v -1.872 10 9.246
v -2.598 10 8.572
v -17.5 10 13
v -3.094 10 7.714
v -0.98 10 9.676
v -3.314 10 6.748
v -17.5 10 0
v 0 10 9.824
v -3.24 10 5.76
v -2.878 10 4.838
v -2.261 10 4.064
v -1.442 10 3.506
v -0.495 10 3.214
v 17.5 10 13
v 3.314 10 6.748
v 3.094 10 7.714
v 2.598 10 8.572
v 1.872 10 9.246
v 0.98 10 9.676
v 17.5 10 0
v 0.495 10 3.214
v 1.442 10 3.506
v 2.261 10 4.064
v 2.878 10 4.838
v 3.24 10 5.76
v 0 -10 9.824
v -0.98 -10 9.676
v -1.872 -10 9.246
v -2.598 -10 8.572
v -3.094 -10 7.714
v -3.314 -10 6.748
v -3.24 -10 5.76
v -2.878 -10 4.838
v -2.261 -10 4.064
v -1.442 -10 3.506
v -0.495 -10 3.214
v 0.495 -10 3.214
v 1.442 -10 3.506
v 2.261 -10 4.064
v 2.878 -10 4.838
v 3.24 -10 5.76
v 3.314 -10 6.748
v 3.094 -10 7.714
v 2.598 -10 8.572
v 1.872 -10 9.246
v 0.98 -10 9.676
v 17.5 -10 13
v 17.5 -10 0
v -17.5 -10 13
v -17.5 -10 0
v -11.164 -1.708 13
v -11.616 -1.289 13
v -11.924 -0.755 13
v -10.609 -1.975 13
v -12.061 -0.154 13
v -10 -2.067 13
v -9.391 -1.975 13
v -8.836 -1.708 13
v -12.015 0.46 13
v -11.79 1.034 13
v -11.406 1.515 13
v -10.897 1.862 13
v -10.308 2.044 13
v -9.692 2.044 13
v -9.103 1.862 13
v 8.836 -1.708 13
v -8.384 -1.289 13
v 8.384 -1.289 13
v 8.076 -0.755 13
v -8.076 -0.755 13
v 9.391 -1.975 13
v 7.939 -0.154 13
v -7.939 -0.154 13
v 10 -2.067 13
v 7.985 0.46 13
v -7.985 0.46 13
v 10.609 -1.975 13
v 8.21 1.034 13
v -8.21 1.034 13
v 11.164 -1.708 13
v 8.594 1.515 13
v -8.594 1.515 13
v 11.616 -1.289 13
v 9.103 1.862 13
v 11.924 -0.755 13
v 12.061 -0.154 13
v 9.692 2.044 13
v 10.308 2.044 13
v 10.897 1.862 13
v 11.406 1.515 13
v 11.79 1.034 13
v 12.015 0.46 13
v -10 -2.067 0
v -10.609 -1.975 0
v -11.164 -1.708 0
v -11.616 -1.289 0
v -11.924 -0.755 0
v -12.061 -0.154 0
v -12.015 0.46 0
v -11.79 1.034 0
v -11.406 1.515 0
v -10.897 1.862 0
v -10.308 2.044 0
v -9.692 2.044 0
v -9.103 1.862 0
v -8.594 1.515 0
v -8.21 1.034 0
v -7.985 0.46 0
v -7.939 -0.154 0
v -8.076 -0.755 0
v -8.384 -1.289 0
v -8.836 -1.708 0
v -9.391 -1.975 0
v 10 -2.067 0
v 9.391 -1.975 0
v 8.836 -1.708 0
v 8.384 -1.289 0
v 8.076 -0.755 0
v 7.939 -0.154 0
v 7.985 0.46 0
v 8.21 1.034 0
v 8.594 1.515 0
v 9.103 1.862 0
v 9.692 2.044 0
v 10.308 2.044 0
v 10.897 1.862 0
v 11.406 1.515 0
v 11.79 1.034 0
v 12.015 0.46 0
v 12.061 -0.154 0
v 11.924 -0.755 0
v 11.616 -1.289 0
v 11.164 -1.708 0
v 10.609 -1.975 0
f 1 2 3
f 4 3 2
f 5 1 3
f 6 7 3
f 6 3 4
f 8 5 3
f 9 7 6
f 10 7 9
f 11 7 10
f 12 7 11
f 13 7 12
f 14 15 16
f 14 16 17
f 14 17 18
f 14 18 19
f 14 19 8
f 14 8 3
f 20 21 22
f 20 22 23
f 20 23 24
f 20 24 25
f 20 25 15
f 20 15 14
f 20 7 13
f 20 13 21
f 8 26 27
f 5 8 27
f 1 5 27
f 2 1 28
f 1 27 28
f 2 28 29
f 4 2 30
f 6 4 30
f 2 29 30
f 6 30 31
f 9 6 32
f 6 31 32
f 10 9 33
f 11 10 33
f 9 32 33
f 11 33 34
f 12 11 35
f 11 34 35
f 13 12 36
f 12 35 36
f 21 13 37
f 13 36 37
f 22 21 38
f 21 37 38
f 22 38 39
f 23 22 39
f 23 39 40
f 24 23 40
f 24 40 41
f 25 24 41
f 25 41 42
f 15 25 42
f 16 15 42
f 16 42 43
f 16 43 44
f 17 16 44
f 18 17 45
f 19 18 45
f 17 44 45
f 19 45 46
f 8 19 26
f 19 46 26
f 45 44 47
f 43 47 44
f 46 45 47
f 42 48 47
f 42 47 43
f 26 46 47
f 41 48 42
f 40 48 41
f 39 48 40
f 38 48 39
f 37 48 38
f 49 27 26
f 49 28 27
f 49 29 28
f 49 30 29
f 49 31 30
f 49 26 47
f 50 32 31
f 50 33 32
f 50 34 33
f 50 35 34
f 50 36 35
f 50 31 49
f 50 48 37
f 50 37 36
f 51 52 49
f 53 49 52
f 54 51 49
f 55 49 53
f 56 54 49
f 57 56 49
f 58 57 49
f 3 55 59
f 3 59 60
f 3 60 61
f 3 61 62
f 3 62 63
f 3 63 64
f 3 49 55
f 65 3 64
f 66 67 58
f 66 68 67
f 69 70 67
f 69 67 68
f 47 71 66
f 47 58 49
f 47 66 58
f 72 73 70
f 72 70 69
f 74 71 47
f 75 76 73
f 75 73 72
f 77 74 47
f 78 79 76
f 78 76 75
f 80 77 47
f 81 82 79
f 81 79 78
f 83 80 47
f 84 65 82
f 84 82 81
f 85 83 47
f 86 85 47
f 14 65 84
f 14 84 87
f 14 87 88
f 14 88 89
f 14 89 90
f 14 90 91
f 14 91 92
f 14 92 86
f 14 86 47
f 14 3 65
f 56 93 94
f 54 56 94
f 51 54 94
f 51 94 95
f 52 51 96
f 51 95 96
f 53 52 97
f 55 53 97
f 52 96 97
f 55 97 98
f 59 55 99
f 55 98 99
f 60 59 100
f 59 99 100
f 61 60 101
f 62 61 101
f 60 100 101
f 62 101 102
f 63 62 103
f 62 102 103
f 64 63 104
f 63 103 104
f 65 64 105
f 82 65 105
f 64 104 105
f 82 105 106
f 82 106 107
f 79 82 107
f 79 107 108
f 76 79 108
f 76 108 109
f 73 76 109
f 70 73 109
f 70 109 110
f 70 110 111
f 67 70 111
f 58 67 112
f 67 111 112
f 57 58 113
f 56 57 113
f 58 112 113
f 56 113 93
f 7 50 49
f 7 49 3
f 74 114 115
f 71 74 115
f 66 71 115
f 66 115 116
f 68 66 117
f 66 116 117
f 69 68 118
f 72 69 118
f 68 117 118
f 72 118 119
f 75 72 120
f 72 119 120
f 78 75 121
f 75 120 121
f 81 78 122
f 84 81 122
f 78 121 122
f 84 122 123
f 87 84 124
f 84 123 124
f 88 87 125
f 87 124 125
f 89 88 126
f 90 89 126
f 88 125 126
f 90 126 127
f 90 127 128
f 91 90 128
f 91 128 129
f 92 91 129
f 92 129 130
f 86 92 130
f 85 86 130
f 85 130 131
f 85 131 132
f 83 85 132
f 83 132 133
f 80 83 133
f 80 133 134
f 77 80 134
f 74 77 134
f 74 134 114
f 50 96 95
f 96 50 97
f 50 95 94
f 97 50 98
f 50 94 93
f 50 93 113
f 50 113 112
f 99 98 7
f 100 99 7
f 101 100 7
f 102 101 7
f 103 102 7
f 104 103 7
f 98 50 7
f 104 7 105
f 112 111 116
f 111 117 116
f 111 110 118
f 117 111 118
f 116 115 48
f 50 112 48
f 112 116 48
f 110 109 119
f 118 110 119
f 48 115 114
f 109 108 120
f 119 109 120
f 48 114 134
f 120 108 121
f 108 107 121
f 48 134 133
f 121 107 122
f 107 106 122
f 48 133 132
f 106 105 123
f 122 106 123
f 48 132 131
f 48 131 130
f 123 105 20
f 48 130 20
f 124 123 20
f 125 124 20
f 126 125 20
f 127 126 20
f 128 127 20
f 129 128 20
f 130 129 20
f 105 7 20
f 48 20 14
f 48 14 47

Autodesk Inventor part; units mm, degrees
ref_plane "YZ Plane" through (0, 0, 0) normal (1, 0, 0) x (0, 1, 0)
ref_plane "XZ Plane" through (0, 0, 0) normal (0, 1, 0) x (-1, 0, 0)
ref_plane "XY Plane" through (0, 0, 0) normal (0, 0, 1) x (1, 0, 0)
sketch "Sketch1" plane through (0, 0, 0) normal (0, 0, 1) x (1, 0, 0)
  line L0 (-17.5, 10) -> (17.5, 10)
  line L1 (17.5, 10) -> (17.5, -10)
  line L2 (17.5, -10) -> (-17.5, -10)
  line L3 (-17.5, -10) -> (-17.5, 10)
  point P0 (0, 0)
  dimension "d0" = 35
  dimension "d1" = 20
  dimension "d2" = 10
  dimension "d3" = 17.5
extrude "Extrusion1" add sketch "Sketch1" along normal blind 13
sketch "Sketch2" plane through (0, 0, 13) normal (0, 0, 1) x (1, 0, 0)
  line L0 (-17.5, 10) -> (17.5, 10) projected
  line L1 (-17.5, -10) -> (-17.5, 10) projected
  circle A0 centre (-10, 0) radius 2.1
  circle A1 centre (10, 0) radius 2.1
  point P0 (0, 0)
  dimension "d6" = 4.2
  dimension "d7" = 4.2
  dimension "d8" = 20
  dimension "d9" = 10
  dimension "d10" = 10
  dimension "d11" = 7.5
hole "Hole1" at (-10, 0, 13) at (10, 0, 13) direction (0, 0, -1) diameter 4.134 end through all thread size "M5x0.8" class "6H" standard "ANSI Metric M Profile"
sketch "Sketch3" plane through (-17.5, 10, 0) normal (0, 1, 0) x (1, 0, 0)
  line L0 (0, 0) -> (35, 0) projected
  line L1 (0, 0) -> (0, -13) projected
  circle A0 centre (17.5, -6.5) radius 3.375
  point P0 (17.5, 0)
  dimension "d19" = 6.75
  dimension "d20" = 17.5
  dimension "d21" = 6.5
hole "Hole2" at (0, 10, 6.5) direction (0, -1, 0) diameter 6.647 end through all thread size "M8x1.25" class "6H" standard "ANSI Metric M Profile"
equation "\"d2\" = 0.5 * d1"
equation "\"d3\" = 0.5 * d0"
properties part number "PS20010" material "Acetal Resin, Black"
